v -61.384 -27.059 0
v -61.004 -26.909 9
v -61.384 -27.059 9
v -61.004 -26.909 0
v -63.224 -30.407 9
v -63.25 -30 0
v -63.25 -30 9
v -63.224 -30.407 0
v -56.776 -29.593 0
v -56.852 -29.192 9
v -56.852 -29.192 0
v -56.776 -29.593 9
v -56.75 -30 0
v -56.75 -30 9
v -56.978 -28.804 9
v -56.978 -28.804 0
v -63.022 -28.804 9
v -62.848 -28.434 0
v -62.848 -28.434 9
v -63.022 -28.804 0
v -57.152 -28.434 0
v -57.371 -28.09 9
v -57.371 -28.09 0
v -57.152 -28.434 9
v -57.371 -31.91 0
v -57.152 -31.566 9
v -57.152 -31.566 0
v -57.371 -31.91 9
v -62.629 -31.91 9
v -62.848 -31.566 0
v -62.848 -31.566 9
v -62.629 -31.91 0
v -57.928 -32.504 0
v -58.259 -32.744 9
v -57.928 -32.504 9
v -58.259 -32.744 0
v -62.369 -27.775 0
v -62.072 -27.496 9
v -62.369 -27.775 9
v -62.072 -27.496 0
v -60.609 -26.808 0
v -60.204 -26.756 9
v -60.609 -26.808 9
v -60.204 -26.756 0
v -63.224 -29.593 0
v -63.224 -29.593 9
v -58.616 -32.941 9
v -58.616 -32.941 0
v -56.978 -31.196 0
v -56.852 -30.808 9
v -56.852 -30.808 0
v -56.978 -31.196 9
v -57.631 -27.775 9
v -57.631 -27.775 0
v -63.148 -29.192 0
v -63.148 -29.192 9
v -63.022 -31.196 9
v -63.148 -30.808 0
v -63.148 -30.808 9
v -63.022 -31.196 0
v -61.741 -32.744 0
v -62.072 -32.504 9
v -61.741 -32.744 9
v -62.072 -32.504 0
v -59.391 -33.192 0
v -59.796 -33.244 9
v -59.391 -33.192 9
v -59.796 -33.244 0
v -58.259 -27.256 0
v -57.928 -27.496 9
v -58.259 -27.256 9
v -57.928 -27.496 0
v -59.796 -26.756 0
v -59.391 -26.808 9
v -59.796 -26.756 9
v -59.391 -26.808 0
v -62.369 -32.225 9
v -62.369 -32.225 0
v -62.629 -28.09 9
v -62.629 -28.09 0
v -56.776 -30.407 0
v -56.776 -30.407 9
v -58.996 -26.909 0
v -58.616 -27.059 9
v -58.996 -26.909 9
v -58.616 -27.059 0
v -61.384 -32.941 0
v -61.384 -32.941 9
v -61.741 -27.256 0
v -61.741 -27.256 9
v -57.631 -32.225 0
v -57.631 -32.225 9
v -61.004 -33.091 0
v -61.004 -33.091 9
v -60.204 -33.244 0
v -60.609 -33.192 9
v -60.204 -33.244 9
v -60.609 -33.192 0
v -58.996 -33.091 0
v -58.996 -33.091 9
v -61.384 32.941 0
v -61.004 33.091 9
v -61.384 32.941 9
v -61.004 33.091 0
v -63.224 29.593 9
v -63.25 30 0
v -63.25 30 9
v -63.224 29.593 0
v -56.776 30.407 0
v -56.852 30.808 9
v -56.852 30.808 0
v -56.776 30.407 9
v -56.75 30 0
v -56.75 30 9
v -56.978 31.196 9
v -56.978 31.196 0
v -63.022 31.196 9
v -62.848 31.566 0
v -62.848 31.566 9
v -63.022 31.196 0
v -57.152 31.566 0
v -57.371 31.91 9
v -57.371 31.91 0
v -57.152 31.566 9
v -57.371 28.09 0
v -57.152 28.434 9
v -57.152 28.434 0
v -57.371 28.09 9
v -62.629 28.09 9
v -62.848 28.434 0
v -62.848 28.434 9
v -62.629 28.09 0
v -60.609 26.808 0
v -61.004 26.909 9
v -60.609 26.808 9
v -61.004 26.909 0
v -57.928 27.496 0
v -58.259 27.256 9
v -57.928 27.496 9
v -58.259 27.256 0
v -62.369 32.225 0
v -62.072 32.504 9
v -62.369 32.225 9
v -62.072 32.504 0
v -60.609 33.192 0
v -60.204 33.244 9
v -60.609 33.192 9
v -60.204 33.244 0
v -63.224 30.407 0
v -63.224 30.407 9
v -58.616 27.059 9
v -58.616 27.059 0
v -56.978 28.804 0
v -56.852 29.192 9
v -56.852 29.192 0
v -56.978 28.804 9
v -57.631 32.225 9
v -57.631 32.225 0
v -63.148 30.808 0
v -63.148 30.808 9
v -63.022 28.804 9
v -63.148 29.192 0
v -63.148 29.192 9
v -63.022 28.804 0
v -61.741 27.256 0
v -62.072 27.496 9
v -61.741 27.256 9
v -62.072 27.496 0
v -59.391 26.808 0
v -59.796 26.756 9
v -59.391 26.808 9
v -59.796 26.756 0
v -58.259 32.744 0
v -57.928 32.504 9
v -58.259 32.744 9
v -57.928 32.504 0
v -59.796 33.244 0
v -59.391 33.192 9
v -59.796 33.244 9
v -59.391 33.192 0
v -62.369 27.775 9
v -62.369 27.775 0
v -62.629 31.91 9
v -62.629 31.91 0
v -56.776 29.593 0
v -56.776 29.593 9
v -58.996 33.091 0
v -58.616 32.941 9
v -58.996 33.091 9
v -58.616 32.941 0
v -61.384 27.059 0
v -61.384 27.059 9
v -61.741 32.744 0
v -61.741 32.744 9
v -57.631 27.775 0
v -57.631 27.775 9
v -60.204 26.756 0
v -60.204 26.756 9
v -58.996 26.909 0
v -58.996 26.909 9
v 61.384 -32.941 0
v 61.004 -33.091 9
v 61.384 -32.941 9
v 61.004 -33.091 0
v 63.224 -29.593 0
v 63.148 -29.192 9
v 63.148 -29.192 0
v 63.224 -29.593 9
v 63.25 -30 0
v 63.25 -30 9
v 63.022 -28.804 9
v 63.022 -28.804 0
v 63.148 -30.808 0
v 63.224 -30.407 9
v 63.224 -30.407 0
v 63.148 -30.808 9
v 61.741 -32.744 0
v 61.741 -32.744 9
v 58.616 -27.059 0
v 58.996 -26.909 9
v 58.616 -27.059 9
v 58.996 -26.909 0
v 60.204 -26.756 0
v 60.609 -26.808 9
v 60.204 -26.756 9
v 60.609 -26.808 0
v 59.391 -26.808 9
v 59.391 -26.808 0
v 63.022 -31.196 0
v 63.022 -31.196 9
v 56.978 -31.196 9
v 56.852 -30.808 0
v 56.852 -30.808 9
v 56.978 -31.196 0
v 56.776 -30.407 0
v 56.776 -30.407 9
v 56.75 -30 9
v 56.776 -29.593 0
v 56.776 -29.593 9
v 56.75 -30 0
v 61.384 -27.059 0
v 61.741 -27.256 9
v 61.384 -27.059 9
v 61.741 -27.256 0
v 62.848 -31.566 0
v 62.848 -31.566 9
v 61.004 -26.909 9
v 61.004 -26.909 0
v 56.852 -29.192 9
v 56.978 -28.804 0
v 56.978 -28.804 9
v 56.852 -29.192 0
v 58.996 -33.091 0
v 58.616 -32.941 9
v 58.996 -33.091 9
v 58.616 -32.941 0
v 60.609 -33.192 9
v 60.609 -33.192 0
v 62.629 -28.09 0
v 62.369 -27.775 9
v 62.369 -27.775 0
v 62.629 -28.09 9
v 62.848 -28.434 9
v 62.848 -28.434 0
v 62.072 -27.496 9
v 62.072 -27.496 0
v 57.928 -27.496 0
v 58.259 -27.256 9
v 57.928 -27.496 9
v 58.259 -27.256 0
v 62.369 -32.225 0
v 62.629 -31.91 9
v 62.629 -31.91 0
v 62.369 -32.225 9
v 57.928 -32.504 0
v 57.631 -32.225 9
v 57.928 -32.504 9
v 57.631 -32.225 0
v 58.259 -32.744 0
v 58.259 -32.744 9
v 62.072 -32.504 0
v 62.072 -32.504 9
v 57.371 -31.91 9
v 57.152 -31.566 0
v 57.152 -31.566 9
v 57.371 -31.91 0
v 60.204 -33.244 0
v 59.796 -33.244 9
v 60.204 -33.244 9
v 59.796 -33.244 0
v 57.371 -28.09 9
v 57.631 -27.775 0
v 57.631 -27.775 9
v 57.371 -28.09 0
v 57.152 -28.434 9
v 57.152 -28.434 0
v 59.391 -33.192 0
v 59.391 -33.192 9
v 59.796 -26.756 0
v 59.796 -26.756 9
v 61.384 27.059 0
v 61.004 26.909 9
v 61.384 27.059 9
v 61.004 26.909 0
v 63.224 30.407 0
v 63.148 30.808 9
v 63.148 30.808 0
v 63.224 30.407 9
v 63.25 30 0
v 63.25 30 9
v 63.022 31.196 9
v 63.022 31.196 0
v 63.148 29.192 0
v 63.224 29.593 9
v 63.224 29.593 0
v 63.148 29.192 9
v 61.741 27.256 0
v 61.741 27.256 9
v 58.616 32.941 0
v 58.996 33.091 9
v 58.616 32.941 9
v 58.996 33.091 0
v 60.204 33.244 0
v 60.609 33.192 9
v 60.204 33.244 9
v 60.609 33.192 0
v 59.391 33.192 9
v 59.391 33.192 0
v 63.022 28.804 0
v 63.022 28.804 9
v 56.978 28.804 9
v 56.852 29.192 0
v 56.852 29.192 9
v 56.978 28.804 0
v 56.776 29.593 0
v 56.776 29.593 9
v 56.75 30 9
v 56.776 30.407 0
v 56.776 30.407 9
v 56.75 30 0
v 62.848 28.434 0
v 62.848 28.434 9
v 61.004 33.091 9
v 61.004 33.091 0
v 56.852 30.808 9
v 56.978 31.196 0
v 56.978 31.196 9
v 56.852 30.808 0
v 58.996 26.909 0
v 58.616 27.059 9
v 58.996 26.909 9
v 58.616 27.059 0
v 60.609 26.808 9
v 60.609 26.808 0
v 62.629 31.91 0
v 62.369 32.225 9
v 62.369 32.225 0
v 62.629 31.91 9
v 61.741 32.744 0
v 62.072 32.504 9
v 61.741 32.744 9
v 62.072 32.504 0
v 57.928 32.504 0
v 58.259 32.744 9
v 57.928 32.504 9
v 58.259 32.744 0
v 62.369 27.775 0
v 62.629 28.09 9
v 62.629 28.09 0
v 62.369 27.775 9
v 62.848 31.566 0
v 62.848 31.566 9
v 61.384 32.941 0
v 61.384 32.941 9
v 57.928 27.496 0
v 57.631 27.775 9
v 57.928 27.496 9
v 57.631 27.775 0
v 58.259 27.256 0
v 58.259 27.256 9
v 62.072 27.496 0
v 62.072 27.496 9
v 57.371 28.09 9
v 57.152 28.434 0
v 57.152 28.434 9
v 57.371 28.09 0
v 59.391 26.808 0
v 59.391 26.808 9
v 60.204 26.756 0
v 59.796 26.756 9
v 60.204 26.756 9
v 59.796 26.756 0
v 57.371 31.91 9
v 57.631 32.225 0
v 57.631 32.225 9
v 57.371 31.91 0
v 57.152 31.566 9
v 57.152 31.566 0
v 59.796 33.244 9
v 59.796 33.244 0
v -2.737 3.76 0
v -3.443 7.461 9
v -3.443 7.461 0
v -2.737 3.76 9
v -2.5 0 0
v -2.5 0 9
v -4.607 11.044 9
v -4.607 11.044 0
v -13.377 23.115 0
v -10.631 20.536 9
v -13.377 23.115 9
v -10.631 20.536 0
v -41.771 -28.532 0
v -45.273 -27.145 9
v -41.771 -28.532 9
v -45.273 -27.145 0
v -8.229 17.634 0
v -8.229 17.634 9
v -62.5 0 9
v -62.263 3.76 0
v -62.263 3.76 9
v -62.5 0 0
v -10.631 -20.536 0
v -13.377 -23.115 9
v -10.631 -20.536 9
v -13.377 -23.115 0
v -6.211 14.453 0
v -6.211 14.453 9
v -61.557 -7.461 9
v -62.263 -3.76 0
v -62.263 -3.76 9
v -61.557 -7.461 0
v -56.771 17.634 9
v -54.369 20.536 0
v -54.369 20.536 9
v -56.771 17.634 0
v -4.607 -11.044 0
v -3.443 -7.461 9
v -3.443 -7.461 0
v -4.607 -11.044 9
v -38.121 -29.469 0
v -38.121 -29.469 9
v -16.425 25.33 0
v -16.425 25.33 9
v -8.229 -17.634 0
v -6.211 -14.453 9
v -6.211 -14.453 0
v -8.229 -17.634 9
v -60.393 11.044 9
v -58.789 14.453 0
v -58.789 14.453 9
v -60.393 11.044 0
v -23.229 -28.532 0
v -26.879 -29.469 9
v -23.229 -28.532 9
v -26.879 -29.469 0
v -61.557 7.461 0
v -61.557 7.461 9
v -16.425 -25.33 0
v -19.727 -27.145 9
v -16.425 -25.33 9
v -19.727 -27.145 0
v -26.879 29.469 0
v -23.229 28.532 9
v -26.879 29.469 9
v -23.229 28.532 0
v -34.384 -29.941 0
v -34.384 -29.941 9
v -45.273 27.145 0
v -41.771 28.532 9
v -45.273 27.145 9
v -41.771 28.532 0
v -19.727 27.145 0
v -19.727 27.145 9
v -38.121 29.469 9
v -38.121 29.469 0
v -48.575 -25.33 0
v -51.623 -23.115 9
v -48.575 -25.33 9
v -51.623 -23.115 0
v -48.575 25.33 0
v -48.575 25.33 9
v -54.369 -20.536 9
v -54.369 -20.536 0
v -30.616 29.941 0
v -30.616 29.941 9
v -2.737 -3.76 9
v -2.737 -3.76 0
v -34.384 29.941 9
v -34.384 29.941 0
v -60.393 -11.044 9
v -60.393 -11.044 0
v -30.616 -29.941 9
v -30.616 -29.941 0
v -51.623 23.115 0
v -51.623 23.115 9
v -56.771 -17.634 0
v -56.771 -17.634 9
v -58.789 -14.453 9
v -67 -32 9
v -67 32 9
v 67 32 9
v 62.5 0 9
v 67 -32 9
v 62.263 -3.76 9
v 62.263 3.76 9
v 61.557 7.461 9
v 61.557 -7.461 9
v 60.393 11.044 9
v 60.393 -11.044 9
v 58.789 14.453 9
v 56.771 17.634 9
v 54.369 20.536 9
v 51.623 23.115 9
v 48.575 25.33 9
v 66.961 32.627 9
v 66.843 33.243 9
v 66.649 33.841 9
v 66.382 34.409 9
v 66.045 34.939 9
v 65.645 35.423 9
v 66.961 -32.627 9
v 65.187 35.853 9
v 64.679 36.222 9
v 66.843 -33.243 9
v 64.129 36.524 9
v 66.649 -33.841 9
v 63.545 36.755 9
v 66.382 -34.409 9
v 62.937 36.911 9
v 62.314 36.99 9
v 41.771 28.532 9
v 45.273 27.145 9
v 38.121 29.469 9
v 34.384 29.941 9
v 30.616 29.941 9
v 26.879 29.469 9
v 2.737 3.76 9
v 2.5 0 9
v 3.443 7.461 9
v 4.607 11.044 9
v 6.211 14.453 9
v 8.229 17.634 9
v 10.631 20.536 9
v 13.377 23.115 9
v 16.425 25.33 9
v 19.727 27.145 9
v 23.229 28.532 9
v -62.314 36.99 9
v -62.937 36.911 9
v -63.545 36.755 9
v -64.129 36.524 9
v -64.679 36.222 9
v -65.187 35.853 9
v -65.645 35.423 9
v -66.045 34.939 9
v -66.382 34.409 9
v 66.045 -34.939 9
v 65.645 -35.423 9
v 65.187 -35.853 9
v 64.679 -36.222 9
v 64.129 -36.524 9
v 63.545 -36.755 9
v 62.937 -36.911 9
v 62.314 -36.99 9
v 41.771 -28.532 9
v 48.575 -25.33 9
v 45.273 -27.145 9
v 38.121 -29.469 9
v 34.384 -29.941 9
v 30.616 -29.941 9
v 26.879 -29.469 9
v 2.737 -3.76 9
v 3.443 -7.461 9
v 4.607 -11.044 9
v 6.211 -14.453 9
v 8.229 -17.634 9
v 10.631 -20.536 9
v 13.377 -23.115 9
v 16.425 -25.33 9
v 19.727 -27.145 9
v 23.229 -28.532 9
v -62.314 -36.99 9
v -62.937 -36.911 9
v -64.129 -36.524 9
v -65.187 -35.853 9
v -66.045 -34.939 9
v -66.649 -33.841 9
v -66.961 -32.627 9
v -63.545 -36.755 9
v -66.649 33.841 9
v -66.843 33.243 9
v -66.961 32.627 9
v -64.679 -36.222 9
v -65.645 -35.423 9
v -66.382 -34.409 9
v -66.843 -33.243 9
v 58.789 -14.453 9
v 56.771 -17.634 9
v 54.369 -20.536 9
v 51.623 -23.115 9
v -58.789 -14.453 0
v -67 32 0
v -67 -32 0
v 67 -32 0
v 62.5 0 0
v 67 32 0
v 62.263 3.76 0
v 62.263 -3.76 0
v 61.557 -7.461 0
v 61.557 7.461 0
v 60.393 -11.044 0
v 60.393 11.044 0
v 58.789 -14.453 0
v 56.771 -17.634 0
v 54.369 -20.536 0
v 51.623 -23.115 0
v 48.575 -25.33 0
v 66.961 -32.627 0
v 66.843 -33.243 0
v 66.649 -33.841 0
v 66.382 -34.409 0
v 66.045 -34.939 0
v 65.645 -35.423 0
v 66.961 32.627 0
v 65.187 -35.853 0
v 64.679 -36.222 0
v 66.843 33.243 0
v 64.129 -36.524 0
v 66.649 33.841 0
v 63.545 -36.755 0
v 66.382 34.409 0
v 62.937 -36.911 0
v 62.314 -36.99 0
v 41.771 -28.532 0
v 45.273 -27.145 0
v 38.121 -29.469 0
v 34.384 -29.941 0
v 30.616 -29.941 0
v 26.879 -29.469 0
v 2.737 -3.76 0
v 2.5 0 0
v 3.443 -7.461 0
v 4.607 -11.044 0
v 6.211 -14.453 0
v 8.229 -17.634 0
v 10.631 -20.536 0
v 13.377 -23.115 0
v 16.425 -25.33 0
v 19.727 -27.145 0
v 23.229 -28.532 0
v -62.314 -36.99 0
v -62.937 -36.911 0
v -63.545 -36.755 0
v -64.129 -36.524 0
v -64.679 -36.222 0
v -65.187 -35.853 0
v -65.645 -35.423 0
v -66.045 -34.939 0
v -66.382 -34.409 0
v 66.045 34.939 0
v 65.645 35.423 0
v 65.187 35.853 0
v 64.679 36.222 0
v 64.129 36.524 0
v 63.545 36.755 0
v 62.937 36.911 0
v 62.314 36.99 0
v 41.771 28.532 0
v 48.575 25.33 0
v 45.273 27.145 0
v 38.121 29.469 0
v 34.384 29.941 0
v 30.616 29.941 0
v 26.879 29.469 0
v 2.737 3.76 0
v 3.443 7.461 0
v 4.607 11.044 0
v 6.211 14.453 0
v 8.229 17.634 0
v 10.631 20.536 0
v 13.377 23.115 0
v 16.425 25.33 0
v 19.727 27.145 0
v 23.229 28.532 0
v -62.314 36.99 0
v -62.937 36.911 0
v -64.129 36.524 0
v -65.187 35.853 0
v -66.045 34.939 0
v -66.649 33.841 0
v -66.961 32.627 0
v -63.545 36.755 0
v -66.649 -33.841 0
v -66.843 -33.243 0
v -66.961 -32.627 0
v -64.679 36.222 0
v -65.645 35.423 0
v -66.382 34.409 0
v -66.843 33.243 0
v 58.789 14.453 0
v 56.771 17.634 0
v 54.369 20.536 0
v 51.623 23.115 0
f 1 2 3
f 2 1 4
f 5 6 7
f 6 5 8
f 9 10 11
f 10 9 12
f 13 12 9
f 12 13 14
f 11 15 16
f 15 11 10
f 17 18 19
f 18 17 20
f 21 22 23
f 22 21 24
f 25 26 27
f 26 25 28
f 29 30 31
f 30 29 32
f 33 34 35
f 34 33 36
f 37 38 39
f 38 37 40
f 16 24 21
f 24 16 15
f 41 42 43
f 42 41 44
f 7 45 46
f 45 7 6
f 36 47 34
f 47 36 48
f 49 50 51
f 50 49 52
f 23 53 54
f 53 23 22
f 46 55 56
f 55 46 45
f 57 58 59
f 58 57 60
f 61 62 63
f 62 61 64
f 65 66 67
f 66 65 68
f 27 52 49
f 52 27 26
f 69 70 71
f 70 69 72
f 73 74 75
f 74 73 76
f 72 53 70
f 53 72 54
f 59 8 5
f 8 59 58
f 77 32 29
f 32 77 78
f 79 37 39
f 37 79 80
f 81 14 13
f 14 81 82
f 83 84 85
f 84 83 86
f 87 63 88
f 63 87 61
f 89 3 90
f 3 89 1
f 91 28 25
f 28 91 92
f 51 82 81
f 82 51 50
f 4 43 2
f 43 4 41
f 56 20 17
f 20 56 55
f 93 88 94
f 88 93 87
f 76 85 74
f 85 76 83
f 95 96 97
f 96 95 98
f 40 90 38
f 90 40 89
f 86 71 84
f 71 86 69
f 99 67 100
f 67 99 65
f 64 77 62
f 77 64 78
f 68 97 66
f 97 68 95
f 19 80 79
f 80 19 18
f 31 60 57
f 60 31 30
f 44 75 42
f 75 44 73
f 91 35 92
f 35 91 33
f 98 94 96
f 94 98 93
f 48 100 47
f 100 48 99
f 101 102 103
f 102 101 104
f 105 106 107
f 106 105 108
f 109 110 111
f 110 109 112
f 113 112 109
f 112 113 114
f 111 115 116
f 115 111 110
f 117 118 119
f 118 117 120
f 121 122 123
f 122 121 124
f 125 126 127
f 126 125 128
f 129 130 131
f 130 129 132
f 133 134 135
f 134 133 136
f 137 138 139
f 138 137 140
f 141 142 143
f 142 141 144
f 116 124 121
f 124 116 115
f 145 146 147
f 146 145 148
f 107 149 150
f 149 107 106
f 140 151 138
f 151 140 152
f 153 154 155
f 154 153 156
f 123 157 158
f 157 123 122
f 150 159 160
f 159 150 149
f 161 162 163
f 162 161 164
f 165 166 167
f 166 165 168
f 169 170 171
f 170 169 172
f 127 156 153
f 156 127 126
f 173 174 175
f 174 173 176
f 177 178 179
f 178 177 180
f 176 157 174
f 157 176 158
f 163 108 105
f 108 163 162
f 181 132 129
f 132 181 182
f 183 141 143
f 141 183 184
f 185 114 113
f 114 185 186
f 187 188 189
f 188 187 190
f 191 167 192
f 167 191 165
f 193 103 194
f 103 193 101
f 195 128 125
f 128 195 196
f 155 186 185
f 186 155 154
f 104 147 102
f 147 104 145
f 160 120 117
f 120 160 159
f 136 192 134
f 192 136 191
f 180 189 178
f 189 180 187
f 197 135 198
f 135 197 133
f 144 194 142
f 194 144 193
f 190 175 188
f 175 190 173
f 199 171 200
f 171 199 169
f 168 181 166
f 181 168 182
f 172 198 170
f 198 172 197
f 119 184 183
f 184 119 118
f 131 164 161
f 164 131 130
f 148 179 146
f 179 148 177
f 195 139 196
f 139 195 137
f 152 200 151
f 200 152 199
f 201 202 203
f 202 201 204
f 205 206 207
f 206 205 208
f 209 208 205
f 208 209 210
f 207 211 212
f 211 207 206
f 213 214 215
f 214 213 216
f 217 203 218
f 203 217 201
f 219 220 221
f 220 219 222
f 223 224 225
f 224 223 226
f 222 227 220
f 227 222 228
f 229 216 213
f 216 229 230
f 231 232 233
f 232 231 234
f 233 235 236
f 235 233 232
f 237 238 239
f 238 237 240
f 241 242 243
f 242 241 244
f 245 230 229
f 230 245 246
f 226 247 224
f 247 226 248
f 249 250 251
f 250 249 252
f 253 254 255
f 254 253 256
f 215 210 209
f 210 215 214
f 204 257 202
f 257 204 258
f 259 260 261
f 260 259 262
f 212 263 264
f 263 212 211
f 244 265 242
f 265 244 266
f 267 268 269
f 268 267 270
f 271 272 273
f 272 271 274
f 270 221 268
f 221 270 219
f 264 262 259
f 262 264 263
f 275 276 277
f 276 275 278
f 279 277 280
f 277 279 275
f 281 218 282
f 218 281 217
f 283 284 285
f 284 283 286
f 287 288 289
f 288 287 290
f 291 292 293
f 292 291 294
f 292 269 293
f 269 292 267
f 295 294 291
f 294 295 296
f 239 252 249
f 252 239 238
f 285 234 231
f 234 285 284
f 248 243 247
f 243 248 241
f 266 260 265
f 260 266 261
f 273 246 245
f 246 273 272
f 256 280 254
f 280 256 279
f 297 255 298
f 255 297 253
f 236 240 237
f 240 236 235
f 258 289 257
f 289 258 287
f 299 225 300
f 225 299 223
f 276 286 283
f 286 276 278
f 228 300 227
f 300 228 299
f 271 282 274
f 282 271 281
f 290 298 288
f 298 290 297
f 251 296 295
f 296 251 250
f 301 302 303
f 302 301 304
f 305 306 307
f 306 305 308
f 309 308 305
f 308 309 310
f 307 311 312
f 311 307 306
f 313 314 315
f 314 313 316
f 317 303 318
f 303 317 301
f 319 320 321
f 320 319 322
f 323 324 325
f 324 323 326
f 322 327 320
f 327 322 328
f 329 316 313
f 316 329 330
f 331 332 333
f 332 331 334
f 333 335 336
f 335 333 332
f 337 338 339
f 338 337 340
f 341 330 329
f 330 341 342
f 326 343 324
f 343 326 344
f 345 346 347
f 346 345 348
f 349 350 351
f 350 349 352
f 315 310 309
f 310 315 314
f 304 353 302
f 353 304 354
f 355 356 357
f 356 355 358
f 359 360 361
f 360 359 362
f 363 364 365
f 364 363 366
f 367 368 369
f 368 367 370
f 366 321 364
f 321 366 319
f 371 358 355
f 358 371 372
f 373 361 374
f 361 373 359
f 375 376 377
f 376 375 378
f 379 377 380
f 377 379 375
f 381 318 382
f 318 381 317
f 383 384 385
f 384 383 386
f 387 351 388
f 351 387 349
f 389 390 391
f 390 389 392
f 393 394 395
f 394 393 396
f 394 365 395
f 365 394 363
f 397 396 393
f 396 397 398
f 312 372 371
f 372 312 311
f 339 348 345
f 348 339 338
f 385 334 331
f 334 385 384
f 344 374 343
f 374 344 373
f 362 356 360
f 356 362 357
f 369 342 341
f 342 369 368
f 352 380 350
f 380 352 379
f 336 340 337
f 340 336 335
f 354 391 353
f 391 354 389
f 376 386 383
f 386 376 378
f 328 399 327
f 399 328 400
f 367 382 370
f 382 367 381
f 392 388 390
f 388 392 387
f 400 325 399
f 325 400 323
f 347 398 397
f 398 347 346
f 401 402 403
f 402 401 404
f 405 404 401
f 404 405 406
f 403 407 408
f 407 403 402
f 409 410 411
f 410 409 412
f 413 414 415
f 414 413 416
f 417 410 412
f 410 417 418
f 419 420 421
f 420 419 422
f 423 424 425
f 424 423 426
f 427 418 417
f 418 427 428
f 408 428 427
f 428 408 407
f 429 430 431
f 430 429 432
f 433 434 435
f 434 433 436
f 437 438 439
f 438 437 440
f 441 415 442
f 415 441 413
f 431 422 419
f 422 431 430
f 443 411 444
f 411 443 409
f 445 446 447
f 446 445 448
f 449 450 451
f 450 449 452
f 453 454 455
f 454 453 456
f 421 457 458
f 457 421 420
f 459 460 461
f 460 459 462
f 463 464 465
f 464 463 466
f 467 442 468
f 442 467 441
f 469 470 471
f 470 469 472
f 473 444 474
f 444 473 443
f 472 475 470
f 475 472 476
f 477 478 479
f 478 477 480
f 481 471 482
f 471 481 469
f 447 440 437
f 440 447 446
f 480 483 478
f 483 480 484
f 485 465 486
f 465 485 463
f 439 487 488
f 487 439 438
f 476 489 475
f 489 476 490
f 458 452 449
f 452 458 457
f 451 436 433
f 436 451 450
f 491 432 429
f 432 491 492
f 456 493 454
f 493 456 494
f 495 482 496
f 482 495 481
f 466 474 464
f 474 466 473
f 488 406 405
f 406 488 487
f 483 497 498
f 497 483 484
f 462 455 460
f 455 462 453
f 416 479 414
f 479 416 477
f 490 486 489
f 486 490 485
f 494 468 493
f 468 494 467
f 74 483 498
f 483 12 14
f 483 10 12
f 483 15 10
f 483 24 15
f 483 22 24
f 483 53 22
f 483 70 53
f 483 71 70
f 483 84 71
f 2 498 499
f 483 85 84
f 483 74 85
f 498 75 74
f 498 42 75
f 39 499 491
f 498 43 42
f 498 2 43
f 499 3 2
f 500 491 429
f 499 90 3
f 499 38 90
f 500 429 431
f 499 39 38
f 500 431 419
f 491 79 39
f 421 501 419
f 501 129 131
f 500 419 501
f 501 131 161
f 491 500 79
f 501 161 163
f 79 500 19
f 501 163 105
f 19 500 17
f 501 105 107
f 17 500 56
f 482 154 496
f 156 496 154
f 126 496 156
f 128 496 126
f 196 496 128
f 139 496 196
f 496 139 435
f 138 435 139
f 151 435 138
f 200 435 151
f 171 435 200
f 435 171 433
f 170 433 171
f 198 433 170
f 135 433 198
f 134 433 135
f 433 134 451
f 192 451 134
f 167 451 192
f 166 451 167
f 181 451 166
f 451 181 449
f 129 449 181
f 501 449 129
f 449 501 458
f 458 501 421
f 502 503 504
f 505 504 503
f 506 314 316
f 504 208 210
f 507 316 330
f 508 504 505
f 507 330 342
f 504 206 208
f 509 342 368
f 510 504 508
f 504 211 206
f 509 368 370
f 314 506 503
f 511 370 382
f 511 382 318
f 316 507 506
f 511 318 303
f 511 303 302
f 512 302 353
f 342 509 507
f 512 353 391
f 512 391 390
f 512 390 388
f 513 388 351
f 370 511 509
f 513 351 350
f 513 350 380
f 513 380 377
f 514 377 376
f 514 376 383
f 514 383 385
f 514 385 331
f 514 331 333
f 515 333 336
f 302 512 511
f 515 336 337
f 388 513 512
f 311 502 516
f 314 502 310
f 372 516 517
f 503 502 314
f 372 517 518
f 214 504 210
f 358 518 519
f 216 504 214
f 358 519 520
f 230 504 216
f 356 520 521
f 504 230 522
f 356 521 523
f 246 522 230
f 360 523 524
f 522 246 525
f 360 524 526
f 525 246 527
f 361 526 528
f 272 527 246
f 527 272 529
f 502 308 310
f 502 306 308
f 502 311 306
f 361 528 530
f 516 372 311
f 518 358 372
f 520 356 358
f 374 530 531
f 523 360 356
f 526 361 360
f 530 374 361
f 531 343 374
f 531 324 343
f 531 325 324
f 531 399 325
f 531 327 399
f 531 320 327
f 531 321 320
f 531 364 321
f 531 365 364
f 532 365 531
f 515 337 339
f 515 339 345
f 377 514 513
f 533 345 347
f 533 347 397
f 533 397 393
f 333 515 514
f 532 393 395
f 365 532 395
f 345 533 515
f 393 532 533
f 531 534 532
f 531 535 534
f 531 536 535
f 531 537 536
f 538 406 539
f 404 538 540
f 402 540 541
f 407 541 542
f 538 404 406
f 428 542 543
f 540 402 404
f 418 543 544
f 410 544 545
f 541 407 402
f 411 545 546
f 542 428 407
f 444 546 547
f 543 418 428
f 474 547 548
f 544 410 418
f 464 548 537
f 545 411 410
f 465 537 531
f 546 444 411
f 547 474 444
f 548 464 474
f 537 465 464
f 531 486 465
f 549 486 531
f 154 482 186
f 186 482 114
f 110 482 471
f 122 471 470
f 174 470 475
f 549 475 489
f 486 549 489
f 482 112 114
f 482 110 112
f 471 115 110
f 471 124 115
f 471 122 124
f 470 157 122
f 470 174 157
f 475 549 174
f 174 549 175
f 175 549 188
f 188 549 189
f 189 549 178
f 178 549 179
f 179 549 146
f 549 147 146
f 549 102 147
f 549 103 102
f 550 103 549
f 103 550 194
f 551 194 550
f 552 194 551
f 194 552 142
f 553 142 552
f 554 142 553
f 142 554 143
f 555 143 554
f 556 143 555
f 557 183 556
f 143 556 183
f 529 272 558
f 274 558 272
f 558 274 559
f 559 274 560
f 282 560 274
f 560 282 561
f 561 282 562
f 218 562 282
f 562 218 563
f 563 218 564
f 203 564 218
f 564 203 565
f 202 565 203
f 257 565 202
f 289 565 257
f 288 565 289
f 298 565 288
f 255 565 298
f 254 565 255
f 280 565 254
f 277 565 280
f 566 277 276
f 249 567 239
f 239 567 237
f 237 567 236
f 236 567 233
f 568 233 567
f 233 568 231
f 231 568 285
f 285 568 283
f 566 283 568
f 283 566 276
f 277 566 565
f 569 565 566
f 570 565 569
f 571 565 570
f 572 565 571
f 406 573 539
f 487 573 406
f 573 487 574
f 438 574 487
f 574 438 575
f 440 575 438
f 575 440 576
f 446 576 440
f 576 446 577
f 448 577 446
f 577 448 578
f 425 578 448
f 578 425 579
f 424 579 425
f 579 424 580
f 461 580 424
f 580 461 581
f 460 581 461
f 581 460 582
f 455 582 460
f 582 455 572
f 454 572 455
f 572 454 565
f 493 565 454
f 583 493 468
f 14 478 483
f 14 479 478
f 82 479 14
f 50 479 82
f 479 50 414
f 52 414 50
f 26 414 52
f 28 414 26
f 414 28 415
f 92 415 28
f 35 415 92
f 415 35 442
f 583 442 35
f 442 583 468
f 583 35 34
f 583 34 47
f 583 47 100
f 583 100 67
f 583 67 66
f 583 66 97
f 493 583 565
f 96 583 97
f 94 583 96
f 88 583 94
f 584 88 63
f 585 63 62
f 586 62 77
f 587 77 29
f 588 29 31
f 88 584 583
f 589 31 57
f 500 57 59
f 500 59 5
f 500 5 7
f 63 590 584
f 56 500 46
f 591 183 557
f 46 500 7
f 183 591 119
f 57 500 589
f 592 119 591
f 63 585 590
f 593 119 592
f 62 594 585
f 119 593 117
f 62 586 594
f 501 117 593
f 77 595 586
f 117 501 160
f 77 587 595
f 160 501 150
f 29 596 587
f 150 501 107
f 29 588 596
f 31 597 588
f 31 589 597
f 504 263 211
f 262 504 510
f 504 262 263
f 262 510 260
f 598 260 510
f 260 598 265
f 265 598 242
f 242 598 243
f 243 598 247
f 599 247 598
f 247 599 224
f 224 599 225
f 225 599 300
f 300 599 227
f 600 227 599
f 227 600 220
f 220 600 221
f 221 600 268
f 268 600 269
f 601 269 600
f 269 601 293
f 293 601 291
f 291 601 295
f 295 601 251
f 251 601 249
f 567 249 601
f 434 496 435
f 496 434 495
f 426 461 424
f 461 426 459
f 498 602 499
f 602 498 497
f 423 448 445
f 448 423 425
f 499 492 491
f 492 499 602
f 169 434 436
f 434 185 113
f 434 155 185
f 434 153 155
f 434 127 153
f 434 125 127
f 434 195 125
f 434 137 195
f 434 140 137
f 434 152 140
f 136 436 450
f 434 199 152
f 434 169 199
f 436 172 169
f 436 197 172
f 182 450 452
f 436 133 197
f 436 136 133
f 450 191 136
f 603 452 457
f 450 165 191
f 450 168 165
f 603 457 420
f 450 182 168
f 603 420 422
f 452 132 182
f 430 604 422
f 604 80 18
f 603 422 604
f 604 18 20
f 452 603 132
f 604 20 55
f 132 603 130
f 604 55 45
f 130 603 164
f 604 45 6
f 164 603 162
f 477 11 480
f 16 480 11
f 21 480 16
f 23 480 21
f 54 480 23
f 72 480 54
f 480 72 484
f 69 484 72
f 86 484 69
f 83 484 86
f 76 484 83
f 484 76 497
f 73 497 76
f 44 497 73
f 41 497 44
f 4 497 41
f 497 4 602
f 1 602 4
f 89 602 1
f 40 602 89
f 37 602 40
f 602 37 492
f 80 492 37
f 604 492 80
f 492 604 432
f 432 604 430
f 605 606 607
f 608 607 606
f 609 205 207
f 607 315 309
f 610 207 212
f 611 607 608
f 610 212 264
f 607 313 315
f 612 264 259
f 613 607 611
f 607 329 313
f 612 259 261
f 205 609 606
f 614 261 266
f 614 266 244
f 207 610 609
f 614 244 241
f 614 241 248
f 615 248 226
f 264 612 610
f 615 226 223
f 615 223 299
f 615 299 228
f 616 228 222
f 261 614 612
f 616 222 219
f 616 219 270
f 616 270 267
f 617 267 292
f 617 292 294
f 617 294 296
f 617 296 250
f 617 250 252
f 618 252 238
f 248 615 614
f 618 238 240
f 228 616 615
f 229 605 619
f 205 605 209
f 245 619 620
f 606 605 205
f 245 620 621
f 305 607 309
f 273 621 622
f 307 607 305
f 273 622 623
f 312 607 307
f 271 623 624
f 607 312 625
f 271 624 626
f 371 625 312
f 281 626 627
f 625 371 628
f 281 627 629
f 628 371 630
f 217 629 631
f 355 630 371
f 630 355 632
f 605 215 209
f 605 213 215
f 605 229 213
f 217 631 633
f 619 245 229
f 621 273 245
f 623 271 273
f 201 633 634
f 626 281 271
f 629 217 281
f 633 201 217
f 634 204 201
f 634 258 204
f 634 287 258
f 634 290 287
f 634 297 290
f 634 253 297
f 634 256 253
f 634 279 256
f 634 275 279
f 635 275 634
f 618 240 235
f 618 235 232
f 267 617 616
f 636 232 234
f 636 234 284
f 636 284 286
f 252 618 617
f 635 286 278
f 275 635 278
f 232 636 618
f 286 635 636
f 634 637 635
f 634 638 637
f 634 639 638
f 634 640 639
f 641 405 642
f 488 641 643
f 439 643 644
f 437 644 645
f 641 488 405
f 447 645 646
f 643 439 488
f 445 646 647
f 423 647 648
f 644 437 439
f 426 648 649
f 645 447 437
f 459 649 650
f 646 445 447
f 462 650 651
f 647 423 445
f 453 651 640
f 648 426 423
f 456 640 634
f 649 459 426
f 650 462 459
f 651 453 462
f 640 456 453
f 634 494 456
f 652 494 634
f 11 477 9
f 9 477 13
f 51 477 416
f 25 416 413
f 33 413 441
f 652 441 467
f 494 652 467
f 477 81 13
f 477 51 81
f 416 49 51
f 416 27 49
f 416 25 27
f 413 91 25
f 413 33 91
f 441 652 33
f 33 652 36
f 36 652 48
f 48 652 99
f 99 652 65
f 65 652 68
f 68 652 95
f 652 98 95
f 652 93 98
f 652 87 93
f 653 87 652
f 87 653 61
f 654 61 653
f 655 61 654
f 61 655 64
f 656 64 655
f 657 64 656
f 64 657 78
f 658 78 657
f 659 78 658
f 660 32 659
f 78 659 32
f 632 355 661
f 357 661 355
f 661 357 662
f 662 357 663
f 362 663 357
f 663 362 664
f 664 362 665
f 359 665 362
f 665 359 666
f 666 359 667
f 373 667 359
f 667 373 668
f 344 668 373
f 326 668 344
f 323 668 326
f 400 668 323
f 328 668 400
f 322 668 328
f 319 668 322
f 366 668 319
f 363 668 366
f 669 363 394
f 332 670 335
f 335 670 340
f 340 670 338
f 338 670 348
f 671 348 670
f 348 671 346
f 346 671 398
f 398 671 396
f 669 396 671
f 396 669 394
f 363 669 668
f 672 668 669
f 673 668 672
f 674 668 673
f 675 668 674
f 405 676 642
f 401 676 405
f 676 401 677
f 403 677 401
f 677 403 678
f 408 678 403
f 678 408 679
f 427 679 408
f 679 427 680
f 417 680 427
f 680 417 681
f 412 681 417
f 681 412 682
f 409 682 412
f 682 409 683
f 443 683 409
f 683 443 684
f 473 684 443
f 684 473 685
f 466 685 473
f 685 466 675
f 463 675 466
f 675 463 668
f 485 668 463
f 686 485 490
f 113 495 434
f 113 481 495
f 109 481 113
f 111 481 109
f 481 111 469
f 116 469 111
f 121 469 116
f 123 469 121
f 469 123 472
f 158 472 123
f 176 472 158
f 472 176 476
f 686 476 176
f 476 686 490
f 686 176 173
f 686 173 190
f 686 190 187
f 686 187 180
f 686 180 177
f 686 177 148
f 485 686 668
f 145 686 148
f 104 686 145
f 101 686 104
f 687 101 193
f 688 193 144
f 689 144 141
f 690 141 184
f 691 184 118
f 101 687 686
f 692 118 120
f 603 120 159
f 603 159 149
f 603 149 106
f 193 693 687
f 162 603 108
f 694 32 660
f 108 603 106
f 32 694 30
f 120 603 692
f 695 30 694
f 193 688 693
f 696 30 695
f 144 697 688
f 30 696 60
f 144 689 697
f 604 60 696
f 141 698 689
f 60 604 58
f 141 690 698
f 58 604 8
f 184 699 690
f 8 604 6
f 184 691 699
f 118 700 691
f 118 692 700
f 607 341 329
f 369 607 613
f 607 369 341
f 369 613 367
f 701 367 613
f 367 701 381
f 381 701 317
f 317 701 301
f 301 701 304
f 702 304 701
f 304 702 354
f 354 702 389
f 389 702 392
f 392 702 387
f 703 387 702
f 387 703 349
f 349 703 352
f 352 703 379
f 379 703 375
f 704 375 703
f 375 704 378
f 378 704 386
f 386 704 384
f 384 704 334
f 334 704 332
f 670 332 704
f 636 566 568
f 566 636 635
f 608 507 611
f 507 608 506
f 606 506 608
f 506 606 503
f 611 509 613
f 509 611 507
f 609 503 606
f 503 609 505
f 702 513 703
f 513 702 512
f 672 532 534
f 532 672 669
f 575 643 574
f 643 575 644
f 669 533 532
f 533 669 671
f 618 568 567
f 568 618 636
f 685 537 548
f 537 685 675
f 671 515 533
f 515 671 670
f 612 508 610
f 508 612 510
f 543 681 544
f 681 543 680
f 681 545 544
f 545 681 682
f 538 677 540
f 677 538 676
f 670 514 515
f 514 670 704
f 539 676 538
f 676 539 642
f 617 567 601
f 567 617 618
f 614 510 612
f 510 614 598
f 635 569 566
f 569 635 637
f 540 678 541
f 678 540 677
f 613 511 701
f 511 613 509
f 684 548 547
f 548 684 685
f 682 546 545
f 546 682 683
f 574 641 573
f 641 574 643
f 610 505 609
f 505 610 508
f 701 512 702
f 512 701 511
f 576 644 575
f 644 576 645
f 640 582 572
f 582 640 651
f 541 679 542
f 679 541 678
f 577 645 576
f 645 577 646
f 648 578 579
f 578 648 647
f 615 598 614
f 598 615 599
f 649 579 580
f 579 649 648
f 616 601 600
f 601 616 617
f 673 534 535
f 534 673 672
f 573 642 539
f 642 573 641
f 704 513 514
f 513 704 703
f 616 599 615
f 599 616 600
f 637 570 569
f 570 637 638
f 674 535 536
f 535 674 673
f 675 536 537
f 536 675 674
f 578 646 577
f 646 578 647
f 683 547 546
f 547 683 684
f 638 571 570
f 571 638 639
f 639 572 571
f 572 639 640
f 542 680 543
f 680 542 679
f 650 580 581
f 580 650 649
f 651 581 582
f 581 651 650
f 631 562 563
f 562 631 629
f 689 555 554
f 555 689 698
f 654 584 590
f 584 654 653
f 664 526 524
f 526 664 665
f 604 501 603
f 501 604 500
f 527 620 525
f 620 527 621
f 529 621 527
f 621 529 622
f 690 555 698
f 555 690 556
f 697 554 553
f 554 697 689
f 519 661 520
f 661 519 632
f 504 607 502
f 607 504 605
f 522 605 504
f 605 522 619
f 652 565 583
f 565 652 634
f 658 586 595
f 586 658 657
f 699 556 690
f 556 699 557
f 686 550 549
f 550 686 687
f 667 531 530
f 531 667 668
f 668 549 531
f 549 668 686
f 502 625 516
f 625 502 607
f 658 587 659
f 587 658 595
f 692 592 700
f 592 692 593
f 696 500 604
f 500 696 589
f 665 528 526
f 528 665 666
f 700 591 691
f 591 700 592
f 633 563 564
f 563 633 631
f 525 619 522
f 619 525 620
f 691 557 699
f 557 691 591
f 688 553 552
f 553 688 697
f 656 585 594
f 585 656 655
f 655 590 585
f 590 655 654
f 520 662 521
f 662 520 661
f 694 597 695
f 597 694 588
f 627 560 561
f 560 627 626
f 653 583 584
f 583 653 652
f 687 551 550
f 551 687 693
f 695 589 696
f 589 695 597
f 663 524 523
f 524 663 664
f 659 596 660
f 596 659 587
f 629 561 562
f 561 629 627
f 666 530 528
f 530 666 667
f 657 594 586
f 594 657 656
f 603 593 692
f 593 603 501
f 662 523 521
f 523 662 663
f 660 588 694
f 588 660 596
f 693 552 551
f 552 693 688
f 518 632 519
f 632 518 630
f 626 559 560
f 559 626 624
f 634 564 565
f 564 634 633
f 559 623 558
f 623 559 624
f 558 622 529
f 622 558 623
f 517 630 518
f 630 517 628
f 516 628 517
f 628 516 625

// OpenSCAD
$fn = 50;

difference() {
	union() {
		hull() {
			translate(v = [-62.0, 32.0, 0]) {
				cylinder(h = 9, r = 5);
			}
			translate(v = [62.0, 32.0, 0]) {
				cylinder(h = 9, r = 5);
			}
			translate(v = [-62.0, -32.0, 0]) {
				cylinder(h = 9, r = 5);
			}
			translate(v = [62.0, -32.0, 0]) {
				cylinder(h = 9, r = 5);
			}
		}
	}
	union() {
		translate(v = [-60.0, -30.0, -100.0]) {
			cylinder(h = 200, r = 3.25);
		}
		translate(v = [-60.0, 30.0, -100.0]) {
			cylinder(h = 200, r = 3.25);
		}
		translate(v = [60.0, -30.0, -100.0]) {
			cylinder(h = 200, r = 3.25);
		}
		translate(v = [60.0, 30.0, -100.0]) {
			cylinder(h = 200, r = 3.25);
		}
		translate(v = [-60.0, -30.0, -100.0]) {
			cylinder(h = 200, r = 1.8);
		}
		translate(v = [-60.0, 30.0, -100.0]) {
			cylinder(h = 200, r = 1.8);
		}
		translate(v = [60.0, -30.0, -100.0]) {
			cylinder(h = 200, r = 1.8);
		}
		translate(v = [60.0, 30.0, -100.0]) {
			cylinder(h = 200, r = 1.8);
		}
		translate(v = [-32.5, 0, 0.0]) {
			cylinder(h = 9, r = 30.0);
		}
		translate(v = [32.5, 0, 0.0]) {
			cylinder(h = 9, r = 30.0);
		}
	}
}
